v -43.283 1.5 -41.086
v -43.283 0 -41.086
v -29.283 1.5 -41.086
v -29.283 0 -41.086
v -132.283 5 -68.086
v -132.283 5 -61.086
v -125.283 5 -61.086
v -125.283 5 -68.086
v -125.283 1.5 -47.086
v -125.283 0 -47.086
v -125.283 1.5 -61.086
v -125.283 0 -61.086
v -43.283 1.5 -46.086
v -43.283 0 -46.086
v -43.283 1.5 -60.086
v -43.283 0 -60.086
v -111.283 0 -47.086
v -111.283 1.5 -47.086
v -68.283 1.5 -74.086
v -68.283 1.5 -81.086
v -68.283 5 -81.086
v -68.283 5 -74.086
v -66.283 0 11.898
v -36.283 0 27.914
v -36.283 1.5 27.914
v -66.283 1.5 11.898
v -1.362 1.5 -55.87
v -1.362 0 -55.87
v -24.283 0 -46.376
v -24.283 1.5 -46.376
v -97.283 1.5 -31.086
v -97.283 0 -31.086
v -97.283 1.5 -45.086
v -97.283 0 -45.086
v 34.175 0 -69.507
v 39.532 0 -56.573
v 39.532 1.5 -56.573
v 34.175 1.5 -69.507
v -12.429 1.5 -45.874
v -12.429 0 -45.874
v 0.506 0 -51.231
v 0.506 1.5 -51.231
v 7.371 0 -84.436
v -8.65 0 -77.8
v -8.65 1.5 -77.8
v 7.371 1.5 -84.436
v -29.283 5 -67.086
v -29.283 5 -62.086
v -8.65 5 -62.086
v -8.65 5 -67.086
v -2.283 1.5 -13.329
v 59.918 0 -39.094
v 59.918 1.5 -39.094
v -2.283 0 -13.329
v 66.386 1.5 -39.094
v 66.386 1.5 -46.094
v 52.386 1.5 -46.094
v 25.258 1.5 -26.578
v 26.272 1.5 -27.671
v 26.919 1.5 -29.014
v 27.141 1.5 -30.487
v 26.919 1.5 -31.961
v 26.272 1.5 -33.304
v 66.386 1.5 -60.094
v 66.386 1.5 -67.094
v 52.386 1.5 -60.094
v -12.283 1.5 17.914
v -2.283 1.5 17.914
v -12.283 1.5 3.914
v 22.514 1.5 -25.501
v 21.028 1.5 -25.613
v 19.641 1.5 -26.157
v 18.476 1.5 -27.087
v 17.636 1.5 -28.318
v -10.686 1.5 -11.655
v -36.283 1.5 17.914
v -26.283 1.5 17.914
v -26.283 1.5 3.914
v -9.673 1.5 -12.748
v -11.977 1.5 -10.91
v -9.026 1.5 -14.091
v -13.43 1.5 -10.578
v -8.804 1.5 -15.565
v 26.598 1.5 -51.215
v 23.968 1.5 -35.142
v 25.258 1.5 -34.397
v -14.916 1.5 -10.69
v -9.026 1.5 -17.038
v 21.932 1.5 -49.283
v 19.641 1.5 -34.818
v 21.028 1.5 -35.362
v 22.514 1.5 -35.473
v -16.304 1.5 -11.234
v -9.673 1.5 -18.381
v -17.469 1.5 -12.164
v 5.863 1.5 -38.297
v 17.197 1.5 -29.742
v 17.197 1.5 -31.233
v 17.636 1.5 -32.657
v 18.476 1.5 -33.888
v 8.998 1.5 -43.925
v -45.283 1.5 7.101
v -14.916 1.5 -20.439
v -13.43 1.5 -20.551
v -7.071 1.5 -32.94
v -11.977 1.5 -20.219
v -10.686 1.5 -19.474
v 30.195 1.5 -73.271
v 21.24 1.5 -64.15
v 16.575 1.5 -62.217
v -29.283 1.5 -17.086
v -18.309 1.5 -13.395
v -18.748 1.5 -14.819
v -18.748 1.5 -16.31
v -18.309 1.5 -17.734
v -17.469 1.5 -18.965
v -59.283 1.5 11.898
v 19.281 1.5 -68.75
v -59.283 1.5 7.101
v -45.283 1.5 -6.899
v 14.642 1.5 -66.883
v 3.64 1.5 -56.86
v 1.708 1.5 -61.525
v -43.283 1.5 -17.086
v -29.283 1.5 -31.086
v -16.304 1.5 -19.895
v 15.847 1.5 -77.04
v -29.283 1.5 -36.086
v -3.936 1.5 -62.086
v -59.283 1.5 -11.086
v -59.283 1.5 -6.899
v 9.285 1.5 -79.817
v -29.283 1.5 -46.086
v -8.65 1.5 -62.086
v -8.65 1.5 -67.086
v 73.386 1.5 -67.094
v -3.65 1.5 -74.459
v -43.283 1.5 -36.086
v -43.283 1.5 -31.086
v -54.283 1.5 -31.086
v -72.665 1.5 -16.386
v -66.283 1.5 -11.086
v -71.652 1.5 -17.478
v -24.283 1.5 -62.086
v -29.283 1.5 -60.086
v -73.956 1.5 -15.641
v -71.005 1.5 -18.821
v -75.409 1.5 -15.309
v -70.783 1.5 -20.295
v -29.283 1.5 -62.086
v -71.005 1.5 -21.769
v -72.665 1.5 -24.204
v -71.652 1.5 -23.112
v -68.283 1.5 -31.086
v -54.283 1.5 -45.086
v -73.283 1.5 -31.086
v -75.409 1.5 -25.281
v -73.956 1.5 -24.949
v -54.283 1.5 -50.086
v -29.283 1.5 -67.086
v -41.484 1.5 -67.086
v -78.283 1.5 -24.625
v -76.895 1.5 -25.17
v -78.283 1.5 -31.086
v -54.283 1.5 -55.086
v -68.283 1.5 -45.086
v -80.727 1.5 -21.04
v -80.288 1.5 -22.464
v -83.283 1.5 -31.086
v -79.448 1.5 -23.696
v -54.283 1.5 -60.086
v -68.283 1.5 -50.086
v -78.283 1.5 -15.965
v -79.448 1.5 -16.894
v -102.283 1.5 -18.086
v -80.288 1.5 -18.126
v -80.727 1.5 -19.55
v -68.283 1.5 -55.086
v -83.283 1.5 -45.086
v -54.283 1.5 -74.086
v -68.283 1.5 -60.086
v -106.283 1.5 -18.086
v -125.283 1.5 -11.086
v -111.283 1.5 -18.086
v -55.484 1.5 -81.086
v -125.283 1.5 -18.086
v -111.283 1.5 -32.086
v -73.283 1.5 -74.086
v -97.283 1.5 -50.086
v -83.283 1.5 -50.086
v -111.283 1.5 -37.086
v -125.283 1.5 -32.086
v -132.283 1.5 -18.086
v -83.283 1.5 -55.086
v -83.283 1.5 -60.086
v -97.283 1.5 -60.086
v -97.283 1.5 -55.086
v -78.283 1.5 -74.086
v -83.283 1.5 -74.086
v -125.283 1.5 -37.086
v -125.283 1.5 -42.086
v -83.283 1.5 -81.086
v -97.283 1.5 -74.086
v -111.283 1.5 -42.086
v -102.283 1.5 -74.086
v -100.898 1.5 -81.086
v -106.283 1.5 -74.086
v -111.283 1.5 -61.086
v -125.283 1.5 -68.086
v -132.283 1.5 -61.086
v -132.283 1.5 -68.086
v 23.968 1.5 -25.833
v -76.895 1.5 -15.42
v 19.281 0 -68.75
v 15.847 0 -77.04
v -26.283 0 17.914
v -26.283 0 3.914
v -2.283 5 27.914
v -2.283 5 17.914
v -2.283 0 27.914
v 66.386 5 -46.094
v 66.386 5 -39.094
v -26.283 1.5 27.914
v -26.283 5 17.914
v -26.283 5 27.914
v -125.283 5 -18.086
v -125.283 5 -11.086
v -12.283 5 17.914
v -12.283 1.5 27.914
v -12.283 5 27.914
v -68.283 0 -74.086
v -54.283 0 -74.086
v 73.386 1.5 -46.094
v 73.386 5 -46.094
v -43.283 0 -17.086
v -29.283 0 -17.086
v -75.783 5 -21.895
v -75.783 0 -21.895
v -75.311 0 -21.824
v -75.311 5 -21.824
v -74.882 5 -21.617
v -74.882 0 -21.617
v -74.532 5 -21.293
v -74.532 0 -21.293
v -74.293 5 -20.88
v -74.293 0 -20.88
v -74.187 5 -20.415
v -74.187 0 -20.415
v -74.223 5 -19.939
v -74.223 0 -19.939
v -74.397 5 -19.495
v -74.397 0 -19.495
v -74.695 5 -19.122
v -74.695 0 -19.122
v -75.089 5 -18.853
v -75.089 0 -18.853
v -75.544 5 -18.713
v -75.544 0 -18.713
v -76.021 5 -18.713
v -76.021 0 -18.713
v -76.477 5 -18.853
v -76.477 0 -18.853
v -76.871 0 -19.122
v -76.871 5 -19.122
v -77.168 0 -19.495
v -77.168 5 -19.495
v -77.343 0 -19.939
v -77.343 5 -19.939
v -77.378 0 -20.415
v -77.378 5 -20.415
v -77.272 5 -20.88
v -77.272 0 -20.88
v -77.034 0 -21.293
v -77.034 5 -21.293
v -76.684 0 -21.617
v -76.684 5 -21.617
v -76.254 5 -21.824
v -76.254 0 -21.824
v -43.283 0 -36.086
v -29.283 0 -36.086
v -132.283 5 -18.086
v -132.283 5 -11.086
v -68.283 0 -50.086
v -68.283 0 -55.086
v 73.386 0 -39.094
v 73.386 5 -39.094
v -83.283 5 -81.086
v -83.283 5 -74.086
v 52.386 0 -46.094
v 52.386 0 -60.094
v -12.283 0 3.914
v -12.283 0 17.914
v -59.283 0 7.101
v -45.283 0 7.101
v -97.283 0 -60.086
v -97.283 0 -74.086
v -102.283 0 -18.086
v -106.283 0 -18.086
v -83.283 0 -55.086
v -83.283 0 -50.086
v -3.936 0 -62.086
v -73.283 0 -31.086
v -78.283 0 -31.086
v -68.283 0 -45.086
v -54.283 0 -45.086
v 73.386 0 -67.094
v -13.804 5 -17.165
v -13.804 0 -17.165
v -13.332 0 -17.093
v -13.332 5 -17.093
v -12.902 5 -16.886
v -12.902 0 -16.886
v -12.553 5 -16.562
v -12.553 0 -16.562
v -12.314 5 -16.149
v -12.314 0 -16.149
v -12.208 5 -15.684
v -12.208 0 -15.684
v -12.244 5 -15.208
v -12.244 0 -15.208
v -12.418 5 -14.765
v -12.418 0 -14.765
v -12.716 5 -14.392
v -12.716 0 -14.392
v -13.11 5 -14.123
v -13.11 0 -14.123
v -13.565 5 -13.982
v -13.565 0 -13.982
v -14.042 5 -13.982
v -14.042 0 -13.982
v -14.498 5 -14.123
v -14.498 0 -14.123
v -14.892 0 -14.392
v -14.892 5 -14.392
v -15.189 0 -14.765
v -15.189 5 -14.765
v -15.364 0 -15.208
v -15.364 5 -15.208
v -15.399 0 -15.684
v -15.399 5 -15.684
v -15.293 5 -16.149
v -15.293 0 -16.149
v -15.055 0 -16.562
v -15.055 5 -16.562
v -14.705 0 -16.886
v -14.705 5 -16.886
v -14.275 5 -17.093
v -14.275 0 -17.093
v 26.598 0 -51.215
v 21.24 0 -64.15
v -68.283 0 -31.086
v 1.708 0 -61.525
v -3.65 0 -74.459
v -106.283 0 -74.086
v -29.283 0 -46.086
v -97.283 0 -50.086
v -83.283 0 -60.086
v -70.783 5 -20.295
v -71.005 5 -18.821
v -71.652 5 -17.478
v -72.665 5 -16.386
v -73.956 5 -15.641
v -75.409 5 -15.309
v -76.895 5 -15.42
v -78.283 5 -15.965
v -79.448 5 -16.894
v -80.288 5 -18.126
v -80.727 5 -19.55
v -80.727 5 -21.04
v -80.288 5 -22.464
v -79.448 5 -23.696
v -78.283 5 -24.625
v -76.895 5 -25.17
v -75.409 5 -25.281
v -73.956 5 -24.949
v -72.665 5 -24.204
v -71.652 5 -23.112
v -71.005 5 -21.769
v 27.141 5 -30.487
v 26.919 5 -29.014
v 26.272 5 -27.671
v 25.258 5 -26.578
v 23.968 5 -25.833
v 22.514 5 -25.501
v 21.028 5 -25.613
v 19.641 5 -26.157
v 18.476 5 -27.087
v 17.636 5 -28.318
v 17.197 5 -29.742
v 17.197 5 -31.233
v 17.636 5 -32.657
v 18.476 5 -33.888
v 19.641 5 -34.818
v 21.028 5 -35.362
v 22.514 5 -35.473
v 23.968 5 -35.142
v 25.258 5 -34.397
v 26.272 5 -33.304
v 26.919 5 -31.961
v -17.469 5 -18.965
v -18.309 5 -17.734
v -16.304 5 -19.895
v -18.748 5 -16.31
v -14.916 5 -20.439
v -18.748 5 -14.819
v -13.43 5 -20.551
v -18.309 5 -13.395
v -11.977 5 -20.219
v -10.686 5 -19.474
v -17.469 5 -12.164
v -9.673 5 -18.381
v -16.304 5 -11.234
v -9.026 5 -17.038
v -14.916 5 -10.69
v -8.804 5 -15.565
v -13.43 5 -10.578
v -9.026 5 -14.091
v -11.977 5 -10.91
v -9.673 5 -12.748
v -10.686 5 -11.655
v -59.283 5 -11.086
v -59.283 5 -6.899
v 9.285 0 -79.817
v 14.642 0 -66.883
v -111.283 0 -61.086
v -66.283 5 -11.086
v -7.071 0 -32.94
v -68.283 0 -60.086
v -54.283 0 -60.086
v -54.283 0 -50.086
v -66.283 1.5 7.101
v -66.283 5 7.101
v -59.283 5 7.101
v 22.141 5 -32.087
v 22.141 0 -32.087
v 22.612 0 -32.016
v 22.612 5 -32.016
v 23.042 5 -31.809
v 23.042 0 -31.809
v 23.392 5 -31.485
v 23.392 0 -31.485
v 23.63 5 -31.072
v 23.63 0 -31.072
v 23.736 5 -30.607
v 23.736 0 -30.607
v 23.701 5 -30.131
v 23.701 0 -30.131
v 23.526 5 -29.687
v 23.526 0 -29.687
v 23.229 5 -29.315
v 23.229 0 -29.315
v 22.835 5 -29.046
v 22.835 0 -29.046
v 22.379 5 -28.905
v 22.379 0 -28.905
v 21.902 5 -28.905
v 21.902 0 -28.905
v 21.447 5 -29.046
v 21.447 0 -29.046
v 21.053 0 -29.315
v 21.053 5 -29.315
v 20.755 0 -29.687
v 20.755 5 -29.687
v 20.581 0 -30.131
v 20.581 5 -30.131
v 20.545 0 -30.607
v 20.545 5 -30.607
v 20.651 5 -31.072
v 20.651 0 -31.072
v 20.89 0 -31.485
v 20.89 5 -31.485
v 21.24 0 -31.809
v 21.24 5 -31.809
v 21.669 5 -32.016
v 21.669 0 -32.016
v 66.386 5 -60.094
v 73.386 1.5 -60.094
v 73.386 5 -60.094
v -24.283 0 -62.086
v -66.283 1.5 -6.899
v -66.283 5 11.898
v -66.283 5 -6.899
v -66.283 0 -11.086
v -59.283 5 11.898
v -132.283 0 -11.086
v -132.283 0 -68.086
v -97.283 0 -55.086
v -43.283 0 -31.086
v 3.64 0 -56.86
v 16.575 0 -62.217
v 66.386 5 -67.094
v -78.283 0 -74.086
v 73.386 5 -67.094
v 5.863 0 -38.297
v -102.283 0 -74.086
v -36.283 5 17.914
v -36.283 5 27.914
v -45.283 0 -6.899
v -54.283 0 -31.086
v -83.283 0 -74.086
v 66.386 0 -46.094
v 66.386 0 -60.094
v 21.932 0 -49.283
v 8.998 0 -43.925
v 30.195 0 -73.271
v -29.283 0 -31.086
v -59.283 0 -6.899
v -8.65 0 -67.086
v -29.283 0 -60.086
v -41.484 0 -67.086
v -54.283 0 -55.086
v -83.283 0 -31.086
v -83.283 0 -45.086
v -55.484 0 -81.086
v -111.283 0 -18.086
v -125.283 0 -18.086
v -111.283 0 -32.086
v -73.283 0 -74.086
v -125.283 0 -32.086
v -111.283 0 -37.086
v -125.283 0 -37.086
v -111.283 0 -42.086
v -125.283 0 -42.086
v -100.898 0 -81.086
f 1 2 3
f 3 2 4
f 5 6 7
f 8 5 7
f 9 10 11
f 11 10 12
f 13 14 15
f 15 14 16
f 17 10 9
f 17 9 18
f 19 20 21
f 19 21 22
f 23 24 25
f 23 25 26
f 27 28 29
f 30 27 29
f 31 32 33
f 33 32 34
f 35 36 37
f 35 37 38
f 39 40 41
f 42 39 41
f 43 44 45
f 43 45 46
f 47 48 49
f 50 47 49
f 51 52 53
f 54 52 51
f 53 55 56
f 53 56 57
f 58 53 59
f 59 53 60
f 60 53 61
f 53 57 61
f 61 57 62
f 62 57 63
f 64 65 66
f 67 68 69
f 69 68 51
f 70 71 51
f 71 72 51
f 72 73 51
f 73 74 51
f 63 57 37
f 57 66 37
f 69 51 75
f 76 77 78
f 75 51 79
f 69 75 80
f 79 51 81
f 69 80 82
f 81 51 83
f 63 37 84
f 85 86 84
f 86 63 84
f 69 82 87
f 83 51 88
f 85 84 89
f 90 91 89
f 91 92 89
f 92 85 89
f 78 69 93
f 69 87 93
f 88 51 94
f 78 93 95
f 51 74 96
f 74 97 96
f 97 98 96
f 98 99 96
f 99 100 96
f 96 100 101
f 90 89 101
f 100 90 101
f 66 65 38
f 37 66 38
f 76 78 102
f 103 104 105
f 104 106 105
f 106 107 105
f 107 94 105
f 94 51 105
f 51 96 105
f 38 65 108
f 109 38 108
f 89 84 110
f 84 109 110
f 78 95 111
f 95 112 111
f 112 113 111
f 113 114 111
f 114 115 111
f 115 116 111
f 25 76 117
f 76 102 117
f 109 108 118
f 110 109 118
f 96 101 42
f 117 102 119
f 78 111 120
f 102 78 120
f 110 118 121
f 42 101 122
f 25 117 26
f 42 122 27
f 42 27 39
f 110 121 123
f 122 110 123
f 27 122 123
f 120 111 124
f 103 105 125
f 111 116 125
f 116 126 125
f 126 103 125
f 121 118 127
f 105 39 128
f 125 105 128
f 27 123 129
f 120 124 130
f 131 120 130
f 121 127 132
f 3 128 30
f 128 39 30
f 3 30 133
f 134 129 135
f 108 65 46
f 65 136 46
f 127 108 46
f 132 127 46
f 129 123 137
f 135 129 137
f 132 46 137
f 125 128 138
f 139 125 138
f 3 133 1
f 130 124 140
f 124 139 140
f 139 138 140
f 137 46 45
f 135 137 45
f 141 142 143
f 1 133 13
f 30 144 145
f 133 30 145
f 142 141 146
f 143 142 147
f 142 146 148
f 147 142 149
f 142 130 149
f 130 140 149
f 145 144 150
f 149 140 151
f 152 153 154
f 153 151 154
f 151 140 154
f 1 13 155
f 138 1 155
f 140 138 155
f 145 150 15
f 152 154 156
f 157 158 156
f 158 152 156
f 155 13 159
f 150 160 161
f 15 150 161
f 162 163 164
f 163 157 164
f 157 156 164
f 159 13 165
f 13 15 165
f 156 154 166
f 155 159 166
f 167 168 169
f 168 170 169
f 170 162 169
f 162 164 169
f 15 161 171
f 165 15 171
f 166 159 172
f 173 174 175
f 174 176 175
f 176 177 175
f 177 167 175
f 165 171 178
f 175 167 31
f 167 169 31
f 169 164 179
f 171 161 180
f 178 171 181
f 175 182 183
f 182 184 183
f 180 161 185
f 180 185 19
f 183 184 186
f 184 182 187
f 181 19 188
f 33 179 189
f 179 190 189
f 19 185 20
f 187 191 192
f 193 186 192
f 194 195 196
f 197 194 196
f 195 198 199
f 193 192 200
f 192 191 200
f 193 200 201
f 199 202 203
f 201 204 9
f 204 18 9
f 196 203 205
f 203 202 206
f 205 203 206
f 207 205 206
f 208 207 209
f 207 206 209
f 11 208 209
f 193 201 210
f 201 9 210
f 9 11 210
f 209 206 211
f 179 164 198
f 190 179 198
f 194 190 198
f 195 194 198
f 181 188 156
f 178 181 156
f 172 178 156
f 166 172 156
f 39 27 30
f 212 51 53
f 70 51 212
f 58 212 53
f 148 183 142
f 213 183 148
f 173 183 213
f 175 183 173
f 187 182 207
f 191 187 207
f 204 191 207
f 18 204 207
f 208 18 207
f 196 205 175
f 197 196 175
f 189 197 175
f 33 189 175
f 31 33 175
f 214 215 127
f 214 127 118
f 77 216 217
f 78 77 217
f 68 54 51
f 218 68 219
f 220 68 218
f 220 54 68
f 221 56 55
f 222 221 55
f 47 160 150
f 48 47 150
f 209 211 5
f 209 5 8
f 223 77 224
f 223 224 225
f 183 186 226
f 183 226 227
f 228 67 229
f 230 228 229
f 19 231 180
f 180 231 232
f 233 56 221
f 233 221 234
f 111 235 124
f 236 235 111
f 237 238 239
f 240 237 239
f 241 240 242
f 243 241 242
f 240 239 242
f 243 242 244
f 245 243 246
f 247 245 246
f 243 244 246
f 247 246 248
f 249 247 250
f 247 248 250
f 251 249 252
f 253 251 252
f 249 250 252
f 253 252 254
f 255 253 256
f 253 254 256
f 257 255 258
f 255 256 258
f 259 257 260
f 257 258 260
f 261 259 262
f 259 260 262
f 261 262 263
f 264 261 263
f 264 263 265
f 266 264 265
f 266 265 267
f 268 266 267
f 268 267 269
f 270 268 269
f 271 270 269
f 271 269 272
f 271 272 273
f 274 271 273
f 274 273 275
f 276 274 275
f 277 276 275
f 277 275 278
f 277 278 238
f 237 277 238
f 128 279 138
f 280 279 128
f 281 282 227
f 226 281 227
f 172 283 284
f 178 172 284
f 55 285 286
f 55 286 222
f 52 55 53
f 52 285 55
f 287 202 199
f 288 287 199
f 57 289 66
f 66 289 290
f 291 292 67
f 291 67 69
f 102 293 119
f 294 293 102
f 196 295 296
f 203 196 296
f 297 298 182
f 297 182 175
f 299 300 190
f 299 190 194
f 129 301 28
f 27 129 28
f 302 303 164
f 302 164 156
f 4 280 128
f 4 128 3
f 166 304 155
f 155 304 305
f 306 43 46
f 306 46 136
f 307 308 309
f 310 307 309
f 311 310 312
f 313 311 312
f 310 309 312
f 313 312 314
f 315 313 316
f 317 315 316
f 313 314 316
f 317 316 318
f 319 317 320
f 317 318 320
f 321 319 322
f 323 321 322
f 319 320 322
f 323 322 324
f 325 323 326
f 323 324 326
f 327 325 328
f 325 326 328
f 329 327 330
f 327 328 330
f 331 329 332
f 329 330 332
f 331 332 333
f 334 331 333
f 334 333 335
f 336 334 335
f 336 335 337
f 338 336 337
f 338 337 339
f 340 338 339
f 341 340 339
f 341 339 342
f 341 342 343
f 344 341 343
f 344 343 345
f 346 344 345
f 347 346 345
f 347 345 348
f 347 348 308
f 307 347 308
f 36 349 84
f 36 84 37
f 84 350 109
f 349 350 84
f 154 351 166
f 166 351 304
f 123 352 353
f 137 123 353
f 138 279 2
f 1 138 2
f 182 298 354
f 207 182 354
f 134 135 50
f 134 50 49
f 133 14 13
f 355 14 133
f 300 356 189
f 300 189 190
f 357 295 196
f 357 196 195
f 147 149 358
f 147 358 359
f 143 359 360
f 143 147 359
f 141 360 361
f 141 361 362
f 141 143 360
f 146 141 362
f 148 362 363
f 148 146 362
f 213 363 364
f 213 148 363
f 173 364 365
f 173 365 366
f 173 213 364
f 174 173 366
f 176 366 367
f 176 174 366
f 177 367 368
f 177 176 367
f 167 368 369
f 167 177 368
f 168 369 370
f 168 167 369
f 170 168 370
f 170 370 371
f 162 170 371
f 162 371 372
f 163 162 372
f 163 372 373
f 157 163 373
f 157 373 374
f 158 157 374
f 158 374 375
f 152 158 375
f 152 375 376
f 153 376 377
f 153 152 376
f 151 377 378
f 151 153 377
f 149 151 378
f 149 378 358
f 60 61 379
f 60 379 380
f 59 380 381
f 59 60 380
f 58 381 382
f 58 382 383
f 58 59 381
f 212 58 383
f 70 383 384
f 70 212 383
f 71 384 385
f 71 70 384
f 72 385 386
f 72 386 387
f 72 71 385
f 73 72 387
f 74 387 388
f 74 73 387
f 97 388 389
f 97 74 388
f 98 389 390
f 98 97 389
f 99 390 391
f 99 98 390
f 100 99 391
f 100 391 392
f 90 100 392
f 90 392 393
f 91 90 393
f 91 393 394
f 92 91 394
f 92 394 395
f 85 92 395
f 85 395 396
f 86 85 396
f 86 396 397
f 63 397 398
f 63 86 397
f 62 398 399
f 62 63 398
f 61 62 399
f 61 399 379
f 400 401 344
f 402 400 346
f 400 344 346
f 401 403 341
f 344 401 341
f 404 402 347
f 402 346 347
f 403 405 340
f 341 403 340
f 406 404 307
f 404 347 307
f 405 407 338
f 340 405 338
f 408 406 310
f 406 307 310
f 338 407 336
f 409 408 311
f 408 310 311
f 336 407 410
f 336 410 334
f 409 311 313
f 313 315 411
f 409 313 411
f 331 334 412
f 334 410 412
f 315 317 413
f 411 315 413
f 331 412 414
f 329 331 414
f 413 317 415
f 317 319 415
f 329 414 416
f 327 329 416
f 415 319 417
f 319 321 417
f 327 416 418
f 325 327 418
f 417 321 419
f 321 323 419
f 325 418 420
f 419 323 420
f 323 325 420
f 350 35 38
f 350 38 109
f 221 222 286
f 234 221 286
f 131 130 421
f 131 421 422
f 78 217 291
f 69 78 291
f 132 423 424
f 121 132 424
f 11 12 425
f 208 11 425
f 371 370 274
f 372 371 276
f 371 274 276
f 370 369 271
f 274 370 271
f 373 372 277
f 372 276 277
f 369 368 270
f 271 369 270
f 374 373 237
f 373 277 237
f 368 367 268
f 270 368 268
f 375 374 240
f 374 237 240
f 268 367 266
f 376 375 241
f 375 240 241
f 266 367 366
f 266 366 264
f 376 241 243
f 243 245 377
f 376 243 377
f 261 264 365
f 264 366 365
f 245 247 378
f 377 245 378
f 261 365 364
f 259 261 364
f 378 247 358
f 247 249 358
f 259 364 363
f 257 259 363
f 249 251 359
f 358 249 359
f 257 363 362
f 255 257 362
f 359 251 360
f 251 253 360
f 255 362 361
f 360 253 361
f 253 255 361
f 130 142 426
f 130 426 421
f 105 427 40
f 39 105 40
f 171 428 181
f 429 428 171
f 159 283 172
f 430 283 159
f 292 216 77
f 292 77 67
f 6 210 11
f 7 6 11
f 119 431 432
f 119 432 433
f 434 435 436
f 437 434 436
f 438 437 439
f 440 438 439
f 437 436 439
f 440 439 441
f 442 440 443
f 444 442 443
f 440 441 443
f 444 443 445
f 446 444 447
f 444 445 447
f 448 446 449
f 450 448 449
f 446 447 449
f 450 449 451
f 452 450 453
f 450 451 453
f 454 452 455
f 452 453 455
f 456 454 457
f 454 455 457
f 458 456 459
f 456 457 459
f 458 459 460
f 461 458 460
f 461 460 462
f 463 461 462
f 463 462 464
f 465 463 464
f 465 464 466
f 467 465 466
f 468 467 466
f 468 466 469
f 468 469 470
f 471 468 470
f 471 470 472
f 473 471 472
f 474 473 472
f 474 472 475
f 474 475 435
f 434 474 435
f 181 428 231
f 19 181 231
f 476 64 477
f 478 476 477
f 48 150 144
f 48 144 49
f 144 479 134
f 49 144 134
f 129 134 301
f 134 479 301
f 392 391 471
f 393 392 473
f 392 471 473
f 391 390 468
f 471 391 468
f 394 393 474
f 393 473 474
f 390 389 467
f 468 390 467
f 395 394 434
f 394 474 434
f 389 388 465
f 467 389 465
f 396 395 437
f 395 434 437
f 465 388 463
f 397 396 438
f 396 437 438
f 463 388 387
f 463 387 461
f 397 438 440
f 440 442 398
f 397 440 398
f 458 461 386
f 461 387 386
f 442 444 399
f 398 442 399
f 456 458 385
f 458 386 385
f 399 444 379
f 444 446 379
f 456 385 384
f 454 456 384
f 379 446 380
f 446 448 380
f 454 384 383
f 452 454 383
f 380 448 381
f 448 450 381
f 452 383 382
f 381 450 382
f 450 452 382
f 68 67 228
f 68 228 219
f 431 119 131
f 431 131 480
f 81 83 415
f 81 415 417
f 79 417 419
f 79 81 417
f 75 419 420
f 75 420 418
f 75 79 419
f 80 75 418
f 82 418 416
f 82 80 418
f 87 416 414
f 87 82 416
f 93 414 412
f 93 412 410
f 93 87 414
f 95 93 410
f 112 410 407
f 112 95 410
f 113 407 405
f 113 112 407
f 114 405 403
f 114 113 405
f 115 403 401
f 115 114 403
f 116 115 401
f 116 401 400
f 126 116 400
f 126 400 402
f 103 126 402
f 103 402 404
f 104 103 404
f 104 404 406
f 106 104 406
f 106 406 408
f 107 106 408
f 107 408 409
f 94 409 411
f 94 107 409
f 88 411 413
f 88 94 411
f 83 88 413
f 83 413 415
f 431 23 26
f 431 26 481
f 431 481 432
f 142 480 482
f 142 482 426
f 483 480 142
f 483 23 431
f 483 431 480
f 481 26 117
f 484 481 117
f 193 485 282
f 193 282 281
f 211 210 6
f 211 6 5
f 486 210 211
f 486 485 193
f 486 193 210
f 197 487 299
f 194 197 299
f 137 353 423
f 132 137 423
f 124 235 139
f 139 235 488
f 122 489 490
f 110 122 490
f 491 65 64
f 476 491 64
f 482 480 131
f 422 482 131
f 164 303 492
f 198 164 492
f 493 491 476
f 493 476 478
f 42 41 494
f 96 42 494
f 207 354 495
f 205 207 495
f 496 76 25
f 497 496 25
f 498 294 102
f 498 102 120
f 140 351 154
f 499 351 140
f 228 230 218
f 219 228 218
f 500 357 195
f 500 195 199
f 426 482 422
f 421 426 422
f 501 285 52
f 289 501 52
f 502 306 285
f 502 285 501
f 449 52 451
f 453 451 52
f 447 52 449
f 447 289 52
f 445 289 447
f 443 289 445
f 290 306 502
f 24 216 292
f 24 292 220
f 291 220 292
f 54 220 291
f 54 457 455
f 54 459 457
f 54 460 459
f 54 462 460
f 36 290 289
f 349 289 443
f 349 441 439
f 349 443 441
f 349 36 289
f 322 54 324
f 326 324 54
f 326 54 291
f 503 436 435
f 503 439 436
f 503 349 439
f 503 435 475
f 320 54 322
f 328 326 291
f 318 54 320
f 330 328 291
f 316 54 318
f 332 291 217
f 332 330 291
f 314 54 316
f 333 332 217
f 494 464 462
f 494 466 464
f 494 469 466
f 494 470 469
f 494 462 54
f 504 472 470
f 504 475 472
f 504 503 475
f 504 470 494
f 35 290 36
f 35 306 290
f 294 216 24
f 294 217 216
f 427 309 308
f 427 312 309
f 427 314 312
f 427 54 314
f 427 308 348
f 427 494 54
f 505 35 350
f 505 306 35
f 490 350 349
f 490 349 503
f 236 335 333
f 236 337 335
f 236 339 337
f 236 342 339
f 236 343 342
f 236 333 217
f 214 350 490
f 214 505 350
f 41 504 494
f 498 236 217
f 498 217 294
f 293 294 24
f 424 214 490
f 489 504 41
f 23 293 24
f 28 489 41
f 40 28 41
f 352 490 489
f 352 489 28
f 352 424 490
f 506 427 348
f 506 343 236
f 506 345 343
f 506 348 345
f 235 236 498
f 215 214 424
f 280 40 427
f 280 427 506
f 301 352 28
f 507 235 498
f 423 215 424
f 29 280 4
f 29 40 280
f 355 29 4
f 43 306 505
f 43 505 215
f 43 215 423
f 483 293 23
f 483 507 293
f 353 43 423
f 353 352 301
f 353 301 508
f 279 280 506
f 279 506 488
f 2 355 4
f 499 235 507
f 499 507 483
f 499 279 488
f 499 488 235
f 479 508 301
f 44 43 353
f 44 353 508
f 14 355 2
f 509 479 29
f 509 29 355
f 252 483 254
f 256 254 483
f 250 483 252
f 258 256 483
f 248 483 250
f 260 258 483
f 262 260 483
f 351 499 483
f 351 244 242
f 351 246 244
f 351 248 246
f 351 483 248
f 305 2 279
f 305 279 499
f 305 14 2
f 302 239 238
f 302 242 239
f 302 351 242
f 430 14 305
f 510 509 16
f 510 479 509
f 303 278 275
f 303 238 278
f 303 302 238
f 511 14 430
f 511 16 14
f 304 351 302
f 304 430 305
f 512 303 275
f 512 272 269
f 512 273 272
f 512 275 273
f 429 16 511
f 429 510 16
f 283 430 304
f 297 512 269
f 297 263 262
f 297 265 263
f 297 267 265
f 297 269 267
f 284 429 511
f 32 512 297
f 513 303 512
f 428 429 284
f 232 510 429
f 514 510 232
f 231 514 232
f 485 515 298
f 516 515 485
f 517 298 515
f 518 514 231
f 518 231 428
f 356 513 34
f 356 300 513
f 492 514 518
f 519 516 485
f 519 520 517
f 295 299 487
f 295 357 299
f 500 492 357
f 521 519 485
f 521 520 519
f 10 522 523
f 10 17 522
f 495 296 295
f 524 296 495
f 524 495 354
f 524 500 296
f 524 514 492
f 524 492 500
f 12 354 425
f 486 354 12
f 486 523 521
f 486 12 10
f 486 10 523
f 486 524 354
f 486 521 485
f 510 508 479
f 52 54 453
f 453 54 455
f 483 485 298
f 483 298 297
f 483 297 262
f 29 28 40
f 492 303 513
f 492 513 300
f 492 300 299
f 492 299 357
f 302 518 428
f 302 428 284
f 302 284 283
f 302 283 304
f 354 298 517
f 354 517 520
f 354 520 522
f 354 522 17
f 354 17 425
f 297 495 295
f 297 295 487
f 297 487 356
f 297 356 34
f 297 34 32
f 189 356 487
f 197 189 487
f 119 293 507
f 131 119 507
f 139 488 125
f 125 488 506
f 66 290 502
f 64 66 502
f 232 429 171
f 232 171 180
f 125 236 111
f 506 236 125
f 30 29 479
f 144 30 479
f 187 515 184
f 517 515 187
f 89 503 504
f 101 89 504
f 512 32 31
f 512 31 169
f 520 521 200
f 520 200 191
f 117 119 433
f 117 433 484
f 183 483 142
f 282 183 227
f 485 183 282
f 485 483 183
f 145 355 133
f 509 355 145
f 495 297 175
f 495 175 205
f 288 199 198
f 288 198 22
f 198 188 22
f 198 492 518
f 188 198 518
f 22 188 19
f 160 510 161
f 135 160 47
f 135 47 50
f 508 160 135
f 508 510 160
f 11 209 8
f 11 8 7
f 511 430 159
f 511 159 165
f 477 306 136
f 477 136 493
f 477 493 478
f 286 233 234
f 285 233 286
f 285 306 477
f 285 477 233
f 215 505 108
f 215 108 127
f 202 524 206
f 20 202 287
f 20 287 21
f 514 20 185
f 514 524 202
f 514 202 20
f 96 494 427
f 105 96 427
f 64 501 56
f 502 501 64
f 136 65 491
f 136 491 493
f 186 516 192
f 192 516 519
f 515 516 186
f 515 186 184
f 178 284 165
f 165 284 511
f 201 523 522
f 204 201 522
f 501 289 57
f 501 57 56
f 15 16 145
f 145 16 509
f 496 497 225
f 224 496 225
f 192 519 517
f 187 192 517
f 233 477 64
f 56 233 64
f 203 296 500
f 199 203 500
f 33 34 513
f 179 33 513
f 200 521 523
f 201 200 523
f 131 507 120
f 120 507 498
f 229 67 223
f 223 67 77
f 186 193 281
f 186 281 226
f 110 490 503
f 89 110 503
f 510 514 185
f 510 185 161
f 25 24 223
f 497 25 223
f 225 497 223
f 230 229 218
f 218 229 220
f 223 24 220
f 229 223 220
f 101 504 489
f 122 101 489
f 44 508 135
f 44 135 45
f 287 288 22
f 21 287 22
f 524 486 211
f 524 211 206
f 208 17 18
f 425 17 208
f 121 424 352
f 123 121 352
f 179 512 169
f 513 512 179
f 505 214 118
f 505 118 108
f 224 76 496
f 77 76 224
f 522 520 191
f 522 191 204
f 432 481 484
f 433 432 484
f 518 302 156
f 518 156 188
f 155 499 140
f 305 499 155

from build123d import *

# Parameters (mm, degrees)
SKETCH2_W            = 14
SKETCH2_H            = 14
SKETCH2_W_2          = 4
SKETCH2_H_2          = 56
SKETCH2_W_3          = 5
SKETCH2_H_3          = 43
SKETCH2_H_4          = 5
KEY_PLATE_DEPTH      = 1.5
SKETCH4_W            = 10
SKETCH4_H            = 10
SKETCH4_W_2          = 7
SKETCH4_H_2          = 7
SKETCH4_H_3          = 4.796695527
SKETCH4_H_4          = 4.186773245
SKETCH4_W_3          = 15
SKETCH4_W_4          = 20.633111118
SKETCH4_H_5          = 5
STANDOFFS_DEPTH      = 3.5
SKETCH6_R            = 5
SCREW_GUIDES_DEPTH   = 3.5
M3_CLEARANCE_HOLE1_D = 3.2


with BuildPart() as part:
    # Sketch2 → Key Plate (new body)
    with BuildSketch(Plane(origin=(0, 0, 0), x_dir=(1, 0, 0), z_dir=(0, 1, 0))):
        Polygon((-132.282827099, 11.085546756), (-132.282827099, 68.085546756), (-100.898050788, 81.085546756), (-55.483837226, 81.085546756), (-41.483837226, 67.085546756), (-8.649715981, 67.085546756), (-8.649715981, 77.800355514), (7.371180312, 84.43642804), (73.386249254, 67.093850916), (73.386249254, 39.093850916), (59.91832331, 39.093850916), (-2.282827099, 13.329290821), (-2.282827099, -27.914453244), (-36.282827099, -27.914453244), (-66.282827099, -11.897922016), (-66.282827099, 11.085546756), align=None)
        Polygon((5.863113655, 38.297174055), (-7.0711998, 32.939606002), (-12.428767853, 45.873919457), (0.505545602, 51.23148751), align=None, mode=Mode.SUBTRACT)
        with Locations((-118.282827099, 54.085546756)):
            Rectangle(SKETCH2_W, SKETCH2_H, mode=Mode.SUBTRACT)
        with Locations((-90.282827099, 67.085546756)):
            Rectangle(SKETCH2_W, SKETCH2_H, mode=Mode.SUBTRACT)
        with Locations((-61.282827099, 67.085546756)):
            Rectangle(SKETCH2_W, SKETCH2_H, mode=Mode.SUBTRACT)
        with Locations((-36.282827099, 53.085546756)):
            Rectangle(SKETCH2_W, SKETCH2_H, mode=Mode.SUBTRACT)
        with Locations((-61.282827099, 38.085546756)):
            Rectangle(SKETCH2_W, SKETCH2_H, mode=Mode.SUBTRACT)
        with Locations((-90.282827099, 38.085546756)):
            Rectangle(SKETCH2_W, SKETCH2_H, mode=Mode.SUBTRACT)
        with Locations((-118.282827099, 25.085546756)):
            Rectangle(SKETCH2_W, SKETCH2_H, mode=Mode.SUBTRACT)
        with Locations((-52.282827099, -0.101226489)):
            Rectangle(SKETCH2_W, SKETCH2_H, mode=Mode.SUBTRACT)
        with Locations((-36.282827099, 24.085546756)):
            Rectangle(SKETCH2_W, SKETCH2_H, mode=Mode.SUBTRACT)
        with Locations((-19.282827099, -10.914453244)):
            Rectangle(SKETCH2_W, SKETCH2_H, mode=Mode.SUBTRACT)
        with Locations((59.386249254, 53.093850916)):
            Rectangle(SKETCH2_W, SKETCH2_H, mode=Mode.SUBTRACT)
        Polygon((-3.649715981, 74.459462324), (9.284597474, 79.817030378), (14.642165527, 66.882716922), (1.707852072, 61.525148869), align=None, mode=Mode.SUBTRACT)
        Polygon((3.640403405, 56.85955723), (16.57471686, 62.217125283), (21.932284914, 49.282811828), (8.997971458, 43.925243775), align=None, mode=Mode.SUBTRACT)
        Polygon((26.597876553, 51.215363162), (39.532190008, 56.572931215), (34.174621955, 69.50724467), (21.2403085, 64.149676617), align=None, mode=Mode.SUBTRACT)
        Polygon((-24.282827099, 62.085546756), (-3.936233335, 62.085546756), (-1.361677583, 55.870019344), (-24.282827099, 46.37576835), align=None, mode=Mode.SUBTRACT)
        with Locations((-104.282827099, 46.085546756)):
            Rectangle(SKETCH2_W_2, SKETCH2_H_2, mode=Mode.SUBTRACT)
        with Locations((-75.782827099, 52.585546756)):
            Rectangle(SKETCH2_W_3, SKETCH2_H_3, mode=Mode.SUBTRACT)
        with Locations((-90.282827099, 52.585546756)):
            Rectangle(SKETCH2_W, SKETCH2_H_4, mode=Mode.SUBTRACT)
        with Locations((-61.282827099, 52.585546756)):
            Rectangle(SKETCH2_W, SKETCH2_H_4, mode=Mode.SUBTRACT)
        with Locations((-36.282827099, 38.585546756)):
            Rectangle(SKETCH2_W, SKETCH2_H_4, mode=Mode.SUBTRACT)
        with Locations((-118.282827099, 39.585546756)):
            Rectangle(SKETCH2_W, SKETCH2_H_4, mode=Mode.SUBTRACT)
        Polygon((19.280697361, 68.749940108), (30.195022846, 73.270801748), (15.846767853, 77.040179298), align=None, mode=Mode.SUBTRACT)
    extrude(amount=KEY_PLATE_DEPTH)

    # Sketch4 → Standoffs (add)
    with BuildSketch(Plane.XZ.offset(-1.5)):
        with Locations((-7.282827099, 22.914453244)):
            Rectangle(SKETCH4_W, SKETCH4_H)
        with Locations((69.886249254, -42.593850916)):
            Rectangle(SKETCH4_W_2, SKETCH4_H_2)
        with Locations((69.886249254, -63.593850916)):
            Rectangle(SKETCH4_W_2, SKETCH4_H_2)
        with Locations((-128.782827099, -14.585546756)):
            Rectangle(SKETCH4_W_2, SKETCH4_H_2)
        with Locations((-128.782827099, -64.585546756)):
            Rectangle(SKETCH4_W_2, SKETCH4_H_2)
        with Locations((-62.782827099, 9.499574253)):
            Rectangle(SKETCH4_W_2, SKETCH4_H_3)
        with Locations((-31.282827099, 22.914453244)):
            Rectangle(SKETCH4_W, SKETCH4_H)
        with Locations((-62.782827099, -8.992160134)):
            Rectangle(SKETCH4_W_2, SKETCH4_H_4)
        with Locations((-75.782827099, -77.585546756)):
            Rectangle(SKETCH4_W_3, SKETCH4_H_2)
        with Locations((-18.96627154, -64.585546756)):
            Rectangle(SKETCH4_W_4, SKETCH4_H_5)
    extrude(amount=-STANDOFFS_DEPTH)

    # Sketch6 → Screw Guides (add)
    with BuildSketch(Plane.XZ.offset(-1.5)):
        with Locations((22.140830524, -30.487456679)):
            Circle(SKETCH6_R)
        with Locations((-13.803783609, -15.564500098)):
            Circle(SKETCH6_R)
        with Locations((-75.782827099, -20.294986151)):
            Circle(SKETCH6_R)
    extrude(amount=-SCREW_GUIDES_DEPTH)

    # M3 Clearance Hole1 (through all)
    with Locations(Plane(origin=(22.140830524, 5, -30.487456679), x_dir=(0, 0, 1), z_dir=(0, 1, 0))):
        with Locations((0, 0), (10.192470528, -97.923657623), (14.922956581, -35.944614133)):
            Hole(M3_CLEARANCE_HOLE1_D / 2)


solid = part.part
